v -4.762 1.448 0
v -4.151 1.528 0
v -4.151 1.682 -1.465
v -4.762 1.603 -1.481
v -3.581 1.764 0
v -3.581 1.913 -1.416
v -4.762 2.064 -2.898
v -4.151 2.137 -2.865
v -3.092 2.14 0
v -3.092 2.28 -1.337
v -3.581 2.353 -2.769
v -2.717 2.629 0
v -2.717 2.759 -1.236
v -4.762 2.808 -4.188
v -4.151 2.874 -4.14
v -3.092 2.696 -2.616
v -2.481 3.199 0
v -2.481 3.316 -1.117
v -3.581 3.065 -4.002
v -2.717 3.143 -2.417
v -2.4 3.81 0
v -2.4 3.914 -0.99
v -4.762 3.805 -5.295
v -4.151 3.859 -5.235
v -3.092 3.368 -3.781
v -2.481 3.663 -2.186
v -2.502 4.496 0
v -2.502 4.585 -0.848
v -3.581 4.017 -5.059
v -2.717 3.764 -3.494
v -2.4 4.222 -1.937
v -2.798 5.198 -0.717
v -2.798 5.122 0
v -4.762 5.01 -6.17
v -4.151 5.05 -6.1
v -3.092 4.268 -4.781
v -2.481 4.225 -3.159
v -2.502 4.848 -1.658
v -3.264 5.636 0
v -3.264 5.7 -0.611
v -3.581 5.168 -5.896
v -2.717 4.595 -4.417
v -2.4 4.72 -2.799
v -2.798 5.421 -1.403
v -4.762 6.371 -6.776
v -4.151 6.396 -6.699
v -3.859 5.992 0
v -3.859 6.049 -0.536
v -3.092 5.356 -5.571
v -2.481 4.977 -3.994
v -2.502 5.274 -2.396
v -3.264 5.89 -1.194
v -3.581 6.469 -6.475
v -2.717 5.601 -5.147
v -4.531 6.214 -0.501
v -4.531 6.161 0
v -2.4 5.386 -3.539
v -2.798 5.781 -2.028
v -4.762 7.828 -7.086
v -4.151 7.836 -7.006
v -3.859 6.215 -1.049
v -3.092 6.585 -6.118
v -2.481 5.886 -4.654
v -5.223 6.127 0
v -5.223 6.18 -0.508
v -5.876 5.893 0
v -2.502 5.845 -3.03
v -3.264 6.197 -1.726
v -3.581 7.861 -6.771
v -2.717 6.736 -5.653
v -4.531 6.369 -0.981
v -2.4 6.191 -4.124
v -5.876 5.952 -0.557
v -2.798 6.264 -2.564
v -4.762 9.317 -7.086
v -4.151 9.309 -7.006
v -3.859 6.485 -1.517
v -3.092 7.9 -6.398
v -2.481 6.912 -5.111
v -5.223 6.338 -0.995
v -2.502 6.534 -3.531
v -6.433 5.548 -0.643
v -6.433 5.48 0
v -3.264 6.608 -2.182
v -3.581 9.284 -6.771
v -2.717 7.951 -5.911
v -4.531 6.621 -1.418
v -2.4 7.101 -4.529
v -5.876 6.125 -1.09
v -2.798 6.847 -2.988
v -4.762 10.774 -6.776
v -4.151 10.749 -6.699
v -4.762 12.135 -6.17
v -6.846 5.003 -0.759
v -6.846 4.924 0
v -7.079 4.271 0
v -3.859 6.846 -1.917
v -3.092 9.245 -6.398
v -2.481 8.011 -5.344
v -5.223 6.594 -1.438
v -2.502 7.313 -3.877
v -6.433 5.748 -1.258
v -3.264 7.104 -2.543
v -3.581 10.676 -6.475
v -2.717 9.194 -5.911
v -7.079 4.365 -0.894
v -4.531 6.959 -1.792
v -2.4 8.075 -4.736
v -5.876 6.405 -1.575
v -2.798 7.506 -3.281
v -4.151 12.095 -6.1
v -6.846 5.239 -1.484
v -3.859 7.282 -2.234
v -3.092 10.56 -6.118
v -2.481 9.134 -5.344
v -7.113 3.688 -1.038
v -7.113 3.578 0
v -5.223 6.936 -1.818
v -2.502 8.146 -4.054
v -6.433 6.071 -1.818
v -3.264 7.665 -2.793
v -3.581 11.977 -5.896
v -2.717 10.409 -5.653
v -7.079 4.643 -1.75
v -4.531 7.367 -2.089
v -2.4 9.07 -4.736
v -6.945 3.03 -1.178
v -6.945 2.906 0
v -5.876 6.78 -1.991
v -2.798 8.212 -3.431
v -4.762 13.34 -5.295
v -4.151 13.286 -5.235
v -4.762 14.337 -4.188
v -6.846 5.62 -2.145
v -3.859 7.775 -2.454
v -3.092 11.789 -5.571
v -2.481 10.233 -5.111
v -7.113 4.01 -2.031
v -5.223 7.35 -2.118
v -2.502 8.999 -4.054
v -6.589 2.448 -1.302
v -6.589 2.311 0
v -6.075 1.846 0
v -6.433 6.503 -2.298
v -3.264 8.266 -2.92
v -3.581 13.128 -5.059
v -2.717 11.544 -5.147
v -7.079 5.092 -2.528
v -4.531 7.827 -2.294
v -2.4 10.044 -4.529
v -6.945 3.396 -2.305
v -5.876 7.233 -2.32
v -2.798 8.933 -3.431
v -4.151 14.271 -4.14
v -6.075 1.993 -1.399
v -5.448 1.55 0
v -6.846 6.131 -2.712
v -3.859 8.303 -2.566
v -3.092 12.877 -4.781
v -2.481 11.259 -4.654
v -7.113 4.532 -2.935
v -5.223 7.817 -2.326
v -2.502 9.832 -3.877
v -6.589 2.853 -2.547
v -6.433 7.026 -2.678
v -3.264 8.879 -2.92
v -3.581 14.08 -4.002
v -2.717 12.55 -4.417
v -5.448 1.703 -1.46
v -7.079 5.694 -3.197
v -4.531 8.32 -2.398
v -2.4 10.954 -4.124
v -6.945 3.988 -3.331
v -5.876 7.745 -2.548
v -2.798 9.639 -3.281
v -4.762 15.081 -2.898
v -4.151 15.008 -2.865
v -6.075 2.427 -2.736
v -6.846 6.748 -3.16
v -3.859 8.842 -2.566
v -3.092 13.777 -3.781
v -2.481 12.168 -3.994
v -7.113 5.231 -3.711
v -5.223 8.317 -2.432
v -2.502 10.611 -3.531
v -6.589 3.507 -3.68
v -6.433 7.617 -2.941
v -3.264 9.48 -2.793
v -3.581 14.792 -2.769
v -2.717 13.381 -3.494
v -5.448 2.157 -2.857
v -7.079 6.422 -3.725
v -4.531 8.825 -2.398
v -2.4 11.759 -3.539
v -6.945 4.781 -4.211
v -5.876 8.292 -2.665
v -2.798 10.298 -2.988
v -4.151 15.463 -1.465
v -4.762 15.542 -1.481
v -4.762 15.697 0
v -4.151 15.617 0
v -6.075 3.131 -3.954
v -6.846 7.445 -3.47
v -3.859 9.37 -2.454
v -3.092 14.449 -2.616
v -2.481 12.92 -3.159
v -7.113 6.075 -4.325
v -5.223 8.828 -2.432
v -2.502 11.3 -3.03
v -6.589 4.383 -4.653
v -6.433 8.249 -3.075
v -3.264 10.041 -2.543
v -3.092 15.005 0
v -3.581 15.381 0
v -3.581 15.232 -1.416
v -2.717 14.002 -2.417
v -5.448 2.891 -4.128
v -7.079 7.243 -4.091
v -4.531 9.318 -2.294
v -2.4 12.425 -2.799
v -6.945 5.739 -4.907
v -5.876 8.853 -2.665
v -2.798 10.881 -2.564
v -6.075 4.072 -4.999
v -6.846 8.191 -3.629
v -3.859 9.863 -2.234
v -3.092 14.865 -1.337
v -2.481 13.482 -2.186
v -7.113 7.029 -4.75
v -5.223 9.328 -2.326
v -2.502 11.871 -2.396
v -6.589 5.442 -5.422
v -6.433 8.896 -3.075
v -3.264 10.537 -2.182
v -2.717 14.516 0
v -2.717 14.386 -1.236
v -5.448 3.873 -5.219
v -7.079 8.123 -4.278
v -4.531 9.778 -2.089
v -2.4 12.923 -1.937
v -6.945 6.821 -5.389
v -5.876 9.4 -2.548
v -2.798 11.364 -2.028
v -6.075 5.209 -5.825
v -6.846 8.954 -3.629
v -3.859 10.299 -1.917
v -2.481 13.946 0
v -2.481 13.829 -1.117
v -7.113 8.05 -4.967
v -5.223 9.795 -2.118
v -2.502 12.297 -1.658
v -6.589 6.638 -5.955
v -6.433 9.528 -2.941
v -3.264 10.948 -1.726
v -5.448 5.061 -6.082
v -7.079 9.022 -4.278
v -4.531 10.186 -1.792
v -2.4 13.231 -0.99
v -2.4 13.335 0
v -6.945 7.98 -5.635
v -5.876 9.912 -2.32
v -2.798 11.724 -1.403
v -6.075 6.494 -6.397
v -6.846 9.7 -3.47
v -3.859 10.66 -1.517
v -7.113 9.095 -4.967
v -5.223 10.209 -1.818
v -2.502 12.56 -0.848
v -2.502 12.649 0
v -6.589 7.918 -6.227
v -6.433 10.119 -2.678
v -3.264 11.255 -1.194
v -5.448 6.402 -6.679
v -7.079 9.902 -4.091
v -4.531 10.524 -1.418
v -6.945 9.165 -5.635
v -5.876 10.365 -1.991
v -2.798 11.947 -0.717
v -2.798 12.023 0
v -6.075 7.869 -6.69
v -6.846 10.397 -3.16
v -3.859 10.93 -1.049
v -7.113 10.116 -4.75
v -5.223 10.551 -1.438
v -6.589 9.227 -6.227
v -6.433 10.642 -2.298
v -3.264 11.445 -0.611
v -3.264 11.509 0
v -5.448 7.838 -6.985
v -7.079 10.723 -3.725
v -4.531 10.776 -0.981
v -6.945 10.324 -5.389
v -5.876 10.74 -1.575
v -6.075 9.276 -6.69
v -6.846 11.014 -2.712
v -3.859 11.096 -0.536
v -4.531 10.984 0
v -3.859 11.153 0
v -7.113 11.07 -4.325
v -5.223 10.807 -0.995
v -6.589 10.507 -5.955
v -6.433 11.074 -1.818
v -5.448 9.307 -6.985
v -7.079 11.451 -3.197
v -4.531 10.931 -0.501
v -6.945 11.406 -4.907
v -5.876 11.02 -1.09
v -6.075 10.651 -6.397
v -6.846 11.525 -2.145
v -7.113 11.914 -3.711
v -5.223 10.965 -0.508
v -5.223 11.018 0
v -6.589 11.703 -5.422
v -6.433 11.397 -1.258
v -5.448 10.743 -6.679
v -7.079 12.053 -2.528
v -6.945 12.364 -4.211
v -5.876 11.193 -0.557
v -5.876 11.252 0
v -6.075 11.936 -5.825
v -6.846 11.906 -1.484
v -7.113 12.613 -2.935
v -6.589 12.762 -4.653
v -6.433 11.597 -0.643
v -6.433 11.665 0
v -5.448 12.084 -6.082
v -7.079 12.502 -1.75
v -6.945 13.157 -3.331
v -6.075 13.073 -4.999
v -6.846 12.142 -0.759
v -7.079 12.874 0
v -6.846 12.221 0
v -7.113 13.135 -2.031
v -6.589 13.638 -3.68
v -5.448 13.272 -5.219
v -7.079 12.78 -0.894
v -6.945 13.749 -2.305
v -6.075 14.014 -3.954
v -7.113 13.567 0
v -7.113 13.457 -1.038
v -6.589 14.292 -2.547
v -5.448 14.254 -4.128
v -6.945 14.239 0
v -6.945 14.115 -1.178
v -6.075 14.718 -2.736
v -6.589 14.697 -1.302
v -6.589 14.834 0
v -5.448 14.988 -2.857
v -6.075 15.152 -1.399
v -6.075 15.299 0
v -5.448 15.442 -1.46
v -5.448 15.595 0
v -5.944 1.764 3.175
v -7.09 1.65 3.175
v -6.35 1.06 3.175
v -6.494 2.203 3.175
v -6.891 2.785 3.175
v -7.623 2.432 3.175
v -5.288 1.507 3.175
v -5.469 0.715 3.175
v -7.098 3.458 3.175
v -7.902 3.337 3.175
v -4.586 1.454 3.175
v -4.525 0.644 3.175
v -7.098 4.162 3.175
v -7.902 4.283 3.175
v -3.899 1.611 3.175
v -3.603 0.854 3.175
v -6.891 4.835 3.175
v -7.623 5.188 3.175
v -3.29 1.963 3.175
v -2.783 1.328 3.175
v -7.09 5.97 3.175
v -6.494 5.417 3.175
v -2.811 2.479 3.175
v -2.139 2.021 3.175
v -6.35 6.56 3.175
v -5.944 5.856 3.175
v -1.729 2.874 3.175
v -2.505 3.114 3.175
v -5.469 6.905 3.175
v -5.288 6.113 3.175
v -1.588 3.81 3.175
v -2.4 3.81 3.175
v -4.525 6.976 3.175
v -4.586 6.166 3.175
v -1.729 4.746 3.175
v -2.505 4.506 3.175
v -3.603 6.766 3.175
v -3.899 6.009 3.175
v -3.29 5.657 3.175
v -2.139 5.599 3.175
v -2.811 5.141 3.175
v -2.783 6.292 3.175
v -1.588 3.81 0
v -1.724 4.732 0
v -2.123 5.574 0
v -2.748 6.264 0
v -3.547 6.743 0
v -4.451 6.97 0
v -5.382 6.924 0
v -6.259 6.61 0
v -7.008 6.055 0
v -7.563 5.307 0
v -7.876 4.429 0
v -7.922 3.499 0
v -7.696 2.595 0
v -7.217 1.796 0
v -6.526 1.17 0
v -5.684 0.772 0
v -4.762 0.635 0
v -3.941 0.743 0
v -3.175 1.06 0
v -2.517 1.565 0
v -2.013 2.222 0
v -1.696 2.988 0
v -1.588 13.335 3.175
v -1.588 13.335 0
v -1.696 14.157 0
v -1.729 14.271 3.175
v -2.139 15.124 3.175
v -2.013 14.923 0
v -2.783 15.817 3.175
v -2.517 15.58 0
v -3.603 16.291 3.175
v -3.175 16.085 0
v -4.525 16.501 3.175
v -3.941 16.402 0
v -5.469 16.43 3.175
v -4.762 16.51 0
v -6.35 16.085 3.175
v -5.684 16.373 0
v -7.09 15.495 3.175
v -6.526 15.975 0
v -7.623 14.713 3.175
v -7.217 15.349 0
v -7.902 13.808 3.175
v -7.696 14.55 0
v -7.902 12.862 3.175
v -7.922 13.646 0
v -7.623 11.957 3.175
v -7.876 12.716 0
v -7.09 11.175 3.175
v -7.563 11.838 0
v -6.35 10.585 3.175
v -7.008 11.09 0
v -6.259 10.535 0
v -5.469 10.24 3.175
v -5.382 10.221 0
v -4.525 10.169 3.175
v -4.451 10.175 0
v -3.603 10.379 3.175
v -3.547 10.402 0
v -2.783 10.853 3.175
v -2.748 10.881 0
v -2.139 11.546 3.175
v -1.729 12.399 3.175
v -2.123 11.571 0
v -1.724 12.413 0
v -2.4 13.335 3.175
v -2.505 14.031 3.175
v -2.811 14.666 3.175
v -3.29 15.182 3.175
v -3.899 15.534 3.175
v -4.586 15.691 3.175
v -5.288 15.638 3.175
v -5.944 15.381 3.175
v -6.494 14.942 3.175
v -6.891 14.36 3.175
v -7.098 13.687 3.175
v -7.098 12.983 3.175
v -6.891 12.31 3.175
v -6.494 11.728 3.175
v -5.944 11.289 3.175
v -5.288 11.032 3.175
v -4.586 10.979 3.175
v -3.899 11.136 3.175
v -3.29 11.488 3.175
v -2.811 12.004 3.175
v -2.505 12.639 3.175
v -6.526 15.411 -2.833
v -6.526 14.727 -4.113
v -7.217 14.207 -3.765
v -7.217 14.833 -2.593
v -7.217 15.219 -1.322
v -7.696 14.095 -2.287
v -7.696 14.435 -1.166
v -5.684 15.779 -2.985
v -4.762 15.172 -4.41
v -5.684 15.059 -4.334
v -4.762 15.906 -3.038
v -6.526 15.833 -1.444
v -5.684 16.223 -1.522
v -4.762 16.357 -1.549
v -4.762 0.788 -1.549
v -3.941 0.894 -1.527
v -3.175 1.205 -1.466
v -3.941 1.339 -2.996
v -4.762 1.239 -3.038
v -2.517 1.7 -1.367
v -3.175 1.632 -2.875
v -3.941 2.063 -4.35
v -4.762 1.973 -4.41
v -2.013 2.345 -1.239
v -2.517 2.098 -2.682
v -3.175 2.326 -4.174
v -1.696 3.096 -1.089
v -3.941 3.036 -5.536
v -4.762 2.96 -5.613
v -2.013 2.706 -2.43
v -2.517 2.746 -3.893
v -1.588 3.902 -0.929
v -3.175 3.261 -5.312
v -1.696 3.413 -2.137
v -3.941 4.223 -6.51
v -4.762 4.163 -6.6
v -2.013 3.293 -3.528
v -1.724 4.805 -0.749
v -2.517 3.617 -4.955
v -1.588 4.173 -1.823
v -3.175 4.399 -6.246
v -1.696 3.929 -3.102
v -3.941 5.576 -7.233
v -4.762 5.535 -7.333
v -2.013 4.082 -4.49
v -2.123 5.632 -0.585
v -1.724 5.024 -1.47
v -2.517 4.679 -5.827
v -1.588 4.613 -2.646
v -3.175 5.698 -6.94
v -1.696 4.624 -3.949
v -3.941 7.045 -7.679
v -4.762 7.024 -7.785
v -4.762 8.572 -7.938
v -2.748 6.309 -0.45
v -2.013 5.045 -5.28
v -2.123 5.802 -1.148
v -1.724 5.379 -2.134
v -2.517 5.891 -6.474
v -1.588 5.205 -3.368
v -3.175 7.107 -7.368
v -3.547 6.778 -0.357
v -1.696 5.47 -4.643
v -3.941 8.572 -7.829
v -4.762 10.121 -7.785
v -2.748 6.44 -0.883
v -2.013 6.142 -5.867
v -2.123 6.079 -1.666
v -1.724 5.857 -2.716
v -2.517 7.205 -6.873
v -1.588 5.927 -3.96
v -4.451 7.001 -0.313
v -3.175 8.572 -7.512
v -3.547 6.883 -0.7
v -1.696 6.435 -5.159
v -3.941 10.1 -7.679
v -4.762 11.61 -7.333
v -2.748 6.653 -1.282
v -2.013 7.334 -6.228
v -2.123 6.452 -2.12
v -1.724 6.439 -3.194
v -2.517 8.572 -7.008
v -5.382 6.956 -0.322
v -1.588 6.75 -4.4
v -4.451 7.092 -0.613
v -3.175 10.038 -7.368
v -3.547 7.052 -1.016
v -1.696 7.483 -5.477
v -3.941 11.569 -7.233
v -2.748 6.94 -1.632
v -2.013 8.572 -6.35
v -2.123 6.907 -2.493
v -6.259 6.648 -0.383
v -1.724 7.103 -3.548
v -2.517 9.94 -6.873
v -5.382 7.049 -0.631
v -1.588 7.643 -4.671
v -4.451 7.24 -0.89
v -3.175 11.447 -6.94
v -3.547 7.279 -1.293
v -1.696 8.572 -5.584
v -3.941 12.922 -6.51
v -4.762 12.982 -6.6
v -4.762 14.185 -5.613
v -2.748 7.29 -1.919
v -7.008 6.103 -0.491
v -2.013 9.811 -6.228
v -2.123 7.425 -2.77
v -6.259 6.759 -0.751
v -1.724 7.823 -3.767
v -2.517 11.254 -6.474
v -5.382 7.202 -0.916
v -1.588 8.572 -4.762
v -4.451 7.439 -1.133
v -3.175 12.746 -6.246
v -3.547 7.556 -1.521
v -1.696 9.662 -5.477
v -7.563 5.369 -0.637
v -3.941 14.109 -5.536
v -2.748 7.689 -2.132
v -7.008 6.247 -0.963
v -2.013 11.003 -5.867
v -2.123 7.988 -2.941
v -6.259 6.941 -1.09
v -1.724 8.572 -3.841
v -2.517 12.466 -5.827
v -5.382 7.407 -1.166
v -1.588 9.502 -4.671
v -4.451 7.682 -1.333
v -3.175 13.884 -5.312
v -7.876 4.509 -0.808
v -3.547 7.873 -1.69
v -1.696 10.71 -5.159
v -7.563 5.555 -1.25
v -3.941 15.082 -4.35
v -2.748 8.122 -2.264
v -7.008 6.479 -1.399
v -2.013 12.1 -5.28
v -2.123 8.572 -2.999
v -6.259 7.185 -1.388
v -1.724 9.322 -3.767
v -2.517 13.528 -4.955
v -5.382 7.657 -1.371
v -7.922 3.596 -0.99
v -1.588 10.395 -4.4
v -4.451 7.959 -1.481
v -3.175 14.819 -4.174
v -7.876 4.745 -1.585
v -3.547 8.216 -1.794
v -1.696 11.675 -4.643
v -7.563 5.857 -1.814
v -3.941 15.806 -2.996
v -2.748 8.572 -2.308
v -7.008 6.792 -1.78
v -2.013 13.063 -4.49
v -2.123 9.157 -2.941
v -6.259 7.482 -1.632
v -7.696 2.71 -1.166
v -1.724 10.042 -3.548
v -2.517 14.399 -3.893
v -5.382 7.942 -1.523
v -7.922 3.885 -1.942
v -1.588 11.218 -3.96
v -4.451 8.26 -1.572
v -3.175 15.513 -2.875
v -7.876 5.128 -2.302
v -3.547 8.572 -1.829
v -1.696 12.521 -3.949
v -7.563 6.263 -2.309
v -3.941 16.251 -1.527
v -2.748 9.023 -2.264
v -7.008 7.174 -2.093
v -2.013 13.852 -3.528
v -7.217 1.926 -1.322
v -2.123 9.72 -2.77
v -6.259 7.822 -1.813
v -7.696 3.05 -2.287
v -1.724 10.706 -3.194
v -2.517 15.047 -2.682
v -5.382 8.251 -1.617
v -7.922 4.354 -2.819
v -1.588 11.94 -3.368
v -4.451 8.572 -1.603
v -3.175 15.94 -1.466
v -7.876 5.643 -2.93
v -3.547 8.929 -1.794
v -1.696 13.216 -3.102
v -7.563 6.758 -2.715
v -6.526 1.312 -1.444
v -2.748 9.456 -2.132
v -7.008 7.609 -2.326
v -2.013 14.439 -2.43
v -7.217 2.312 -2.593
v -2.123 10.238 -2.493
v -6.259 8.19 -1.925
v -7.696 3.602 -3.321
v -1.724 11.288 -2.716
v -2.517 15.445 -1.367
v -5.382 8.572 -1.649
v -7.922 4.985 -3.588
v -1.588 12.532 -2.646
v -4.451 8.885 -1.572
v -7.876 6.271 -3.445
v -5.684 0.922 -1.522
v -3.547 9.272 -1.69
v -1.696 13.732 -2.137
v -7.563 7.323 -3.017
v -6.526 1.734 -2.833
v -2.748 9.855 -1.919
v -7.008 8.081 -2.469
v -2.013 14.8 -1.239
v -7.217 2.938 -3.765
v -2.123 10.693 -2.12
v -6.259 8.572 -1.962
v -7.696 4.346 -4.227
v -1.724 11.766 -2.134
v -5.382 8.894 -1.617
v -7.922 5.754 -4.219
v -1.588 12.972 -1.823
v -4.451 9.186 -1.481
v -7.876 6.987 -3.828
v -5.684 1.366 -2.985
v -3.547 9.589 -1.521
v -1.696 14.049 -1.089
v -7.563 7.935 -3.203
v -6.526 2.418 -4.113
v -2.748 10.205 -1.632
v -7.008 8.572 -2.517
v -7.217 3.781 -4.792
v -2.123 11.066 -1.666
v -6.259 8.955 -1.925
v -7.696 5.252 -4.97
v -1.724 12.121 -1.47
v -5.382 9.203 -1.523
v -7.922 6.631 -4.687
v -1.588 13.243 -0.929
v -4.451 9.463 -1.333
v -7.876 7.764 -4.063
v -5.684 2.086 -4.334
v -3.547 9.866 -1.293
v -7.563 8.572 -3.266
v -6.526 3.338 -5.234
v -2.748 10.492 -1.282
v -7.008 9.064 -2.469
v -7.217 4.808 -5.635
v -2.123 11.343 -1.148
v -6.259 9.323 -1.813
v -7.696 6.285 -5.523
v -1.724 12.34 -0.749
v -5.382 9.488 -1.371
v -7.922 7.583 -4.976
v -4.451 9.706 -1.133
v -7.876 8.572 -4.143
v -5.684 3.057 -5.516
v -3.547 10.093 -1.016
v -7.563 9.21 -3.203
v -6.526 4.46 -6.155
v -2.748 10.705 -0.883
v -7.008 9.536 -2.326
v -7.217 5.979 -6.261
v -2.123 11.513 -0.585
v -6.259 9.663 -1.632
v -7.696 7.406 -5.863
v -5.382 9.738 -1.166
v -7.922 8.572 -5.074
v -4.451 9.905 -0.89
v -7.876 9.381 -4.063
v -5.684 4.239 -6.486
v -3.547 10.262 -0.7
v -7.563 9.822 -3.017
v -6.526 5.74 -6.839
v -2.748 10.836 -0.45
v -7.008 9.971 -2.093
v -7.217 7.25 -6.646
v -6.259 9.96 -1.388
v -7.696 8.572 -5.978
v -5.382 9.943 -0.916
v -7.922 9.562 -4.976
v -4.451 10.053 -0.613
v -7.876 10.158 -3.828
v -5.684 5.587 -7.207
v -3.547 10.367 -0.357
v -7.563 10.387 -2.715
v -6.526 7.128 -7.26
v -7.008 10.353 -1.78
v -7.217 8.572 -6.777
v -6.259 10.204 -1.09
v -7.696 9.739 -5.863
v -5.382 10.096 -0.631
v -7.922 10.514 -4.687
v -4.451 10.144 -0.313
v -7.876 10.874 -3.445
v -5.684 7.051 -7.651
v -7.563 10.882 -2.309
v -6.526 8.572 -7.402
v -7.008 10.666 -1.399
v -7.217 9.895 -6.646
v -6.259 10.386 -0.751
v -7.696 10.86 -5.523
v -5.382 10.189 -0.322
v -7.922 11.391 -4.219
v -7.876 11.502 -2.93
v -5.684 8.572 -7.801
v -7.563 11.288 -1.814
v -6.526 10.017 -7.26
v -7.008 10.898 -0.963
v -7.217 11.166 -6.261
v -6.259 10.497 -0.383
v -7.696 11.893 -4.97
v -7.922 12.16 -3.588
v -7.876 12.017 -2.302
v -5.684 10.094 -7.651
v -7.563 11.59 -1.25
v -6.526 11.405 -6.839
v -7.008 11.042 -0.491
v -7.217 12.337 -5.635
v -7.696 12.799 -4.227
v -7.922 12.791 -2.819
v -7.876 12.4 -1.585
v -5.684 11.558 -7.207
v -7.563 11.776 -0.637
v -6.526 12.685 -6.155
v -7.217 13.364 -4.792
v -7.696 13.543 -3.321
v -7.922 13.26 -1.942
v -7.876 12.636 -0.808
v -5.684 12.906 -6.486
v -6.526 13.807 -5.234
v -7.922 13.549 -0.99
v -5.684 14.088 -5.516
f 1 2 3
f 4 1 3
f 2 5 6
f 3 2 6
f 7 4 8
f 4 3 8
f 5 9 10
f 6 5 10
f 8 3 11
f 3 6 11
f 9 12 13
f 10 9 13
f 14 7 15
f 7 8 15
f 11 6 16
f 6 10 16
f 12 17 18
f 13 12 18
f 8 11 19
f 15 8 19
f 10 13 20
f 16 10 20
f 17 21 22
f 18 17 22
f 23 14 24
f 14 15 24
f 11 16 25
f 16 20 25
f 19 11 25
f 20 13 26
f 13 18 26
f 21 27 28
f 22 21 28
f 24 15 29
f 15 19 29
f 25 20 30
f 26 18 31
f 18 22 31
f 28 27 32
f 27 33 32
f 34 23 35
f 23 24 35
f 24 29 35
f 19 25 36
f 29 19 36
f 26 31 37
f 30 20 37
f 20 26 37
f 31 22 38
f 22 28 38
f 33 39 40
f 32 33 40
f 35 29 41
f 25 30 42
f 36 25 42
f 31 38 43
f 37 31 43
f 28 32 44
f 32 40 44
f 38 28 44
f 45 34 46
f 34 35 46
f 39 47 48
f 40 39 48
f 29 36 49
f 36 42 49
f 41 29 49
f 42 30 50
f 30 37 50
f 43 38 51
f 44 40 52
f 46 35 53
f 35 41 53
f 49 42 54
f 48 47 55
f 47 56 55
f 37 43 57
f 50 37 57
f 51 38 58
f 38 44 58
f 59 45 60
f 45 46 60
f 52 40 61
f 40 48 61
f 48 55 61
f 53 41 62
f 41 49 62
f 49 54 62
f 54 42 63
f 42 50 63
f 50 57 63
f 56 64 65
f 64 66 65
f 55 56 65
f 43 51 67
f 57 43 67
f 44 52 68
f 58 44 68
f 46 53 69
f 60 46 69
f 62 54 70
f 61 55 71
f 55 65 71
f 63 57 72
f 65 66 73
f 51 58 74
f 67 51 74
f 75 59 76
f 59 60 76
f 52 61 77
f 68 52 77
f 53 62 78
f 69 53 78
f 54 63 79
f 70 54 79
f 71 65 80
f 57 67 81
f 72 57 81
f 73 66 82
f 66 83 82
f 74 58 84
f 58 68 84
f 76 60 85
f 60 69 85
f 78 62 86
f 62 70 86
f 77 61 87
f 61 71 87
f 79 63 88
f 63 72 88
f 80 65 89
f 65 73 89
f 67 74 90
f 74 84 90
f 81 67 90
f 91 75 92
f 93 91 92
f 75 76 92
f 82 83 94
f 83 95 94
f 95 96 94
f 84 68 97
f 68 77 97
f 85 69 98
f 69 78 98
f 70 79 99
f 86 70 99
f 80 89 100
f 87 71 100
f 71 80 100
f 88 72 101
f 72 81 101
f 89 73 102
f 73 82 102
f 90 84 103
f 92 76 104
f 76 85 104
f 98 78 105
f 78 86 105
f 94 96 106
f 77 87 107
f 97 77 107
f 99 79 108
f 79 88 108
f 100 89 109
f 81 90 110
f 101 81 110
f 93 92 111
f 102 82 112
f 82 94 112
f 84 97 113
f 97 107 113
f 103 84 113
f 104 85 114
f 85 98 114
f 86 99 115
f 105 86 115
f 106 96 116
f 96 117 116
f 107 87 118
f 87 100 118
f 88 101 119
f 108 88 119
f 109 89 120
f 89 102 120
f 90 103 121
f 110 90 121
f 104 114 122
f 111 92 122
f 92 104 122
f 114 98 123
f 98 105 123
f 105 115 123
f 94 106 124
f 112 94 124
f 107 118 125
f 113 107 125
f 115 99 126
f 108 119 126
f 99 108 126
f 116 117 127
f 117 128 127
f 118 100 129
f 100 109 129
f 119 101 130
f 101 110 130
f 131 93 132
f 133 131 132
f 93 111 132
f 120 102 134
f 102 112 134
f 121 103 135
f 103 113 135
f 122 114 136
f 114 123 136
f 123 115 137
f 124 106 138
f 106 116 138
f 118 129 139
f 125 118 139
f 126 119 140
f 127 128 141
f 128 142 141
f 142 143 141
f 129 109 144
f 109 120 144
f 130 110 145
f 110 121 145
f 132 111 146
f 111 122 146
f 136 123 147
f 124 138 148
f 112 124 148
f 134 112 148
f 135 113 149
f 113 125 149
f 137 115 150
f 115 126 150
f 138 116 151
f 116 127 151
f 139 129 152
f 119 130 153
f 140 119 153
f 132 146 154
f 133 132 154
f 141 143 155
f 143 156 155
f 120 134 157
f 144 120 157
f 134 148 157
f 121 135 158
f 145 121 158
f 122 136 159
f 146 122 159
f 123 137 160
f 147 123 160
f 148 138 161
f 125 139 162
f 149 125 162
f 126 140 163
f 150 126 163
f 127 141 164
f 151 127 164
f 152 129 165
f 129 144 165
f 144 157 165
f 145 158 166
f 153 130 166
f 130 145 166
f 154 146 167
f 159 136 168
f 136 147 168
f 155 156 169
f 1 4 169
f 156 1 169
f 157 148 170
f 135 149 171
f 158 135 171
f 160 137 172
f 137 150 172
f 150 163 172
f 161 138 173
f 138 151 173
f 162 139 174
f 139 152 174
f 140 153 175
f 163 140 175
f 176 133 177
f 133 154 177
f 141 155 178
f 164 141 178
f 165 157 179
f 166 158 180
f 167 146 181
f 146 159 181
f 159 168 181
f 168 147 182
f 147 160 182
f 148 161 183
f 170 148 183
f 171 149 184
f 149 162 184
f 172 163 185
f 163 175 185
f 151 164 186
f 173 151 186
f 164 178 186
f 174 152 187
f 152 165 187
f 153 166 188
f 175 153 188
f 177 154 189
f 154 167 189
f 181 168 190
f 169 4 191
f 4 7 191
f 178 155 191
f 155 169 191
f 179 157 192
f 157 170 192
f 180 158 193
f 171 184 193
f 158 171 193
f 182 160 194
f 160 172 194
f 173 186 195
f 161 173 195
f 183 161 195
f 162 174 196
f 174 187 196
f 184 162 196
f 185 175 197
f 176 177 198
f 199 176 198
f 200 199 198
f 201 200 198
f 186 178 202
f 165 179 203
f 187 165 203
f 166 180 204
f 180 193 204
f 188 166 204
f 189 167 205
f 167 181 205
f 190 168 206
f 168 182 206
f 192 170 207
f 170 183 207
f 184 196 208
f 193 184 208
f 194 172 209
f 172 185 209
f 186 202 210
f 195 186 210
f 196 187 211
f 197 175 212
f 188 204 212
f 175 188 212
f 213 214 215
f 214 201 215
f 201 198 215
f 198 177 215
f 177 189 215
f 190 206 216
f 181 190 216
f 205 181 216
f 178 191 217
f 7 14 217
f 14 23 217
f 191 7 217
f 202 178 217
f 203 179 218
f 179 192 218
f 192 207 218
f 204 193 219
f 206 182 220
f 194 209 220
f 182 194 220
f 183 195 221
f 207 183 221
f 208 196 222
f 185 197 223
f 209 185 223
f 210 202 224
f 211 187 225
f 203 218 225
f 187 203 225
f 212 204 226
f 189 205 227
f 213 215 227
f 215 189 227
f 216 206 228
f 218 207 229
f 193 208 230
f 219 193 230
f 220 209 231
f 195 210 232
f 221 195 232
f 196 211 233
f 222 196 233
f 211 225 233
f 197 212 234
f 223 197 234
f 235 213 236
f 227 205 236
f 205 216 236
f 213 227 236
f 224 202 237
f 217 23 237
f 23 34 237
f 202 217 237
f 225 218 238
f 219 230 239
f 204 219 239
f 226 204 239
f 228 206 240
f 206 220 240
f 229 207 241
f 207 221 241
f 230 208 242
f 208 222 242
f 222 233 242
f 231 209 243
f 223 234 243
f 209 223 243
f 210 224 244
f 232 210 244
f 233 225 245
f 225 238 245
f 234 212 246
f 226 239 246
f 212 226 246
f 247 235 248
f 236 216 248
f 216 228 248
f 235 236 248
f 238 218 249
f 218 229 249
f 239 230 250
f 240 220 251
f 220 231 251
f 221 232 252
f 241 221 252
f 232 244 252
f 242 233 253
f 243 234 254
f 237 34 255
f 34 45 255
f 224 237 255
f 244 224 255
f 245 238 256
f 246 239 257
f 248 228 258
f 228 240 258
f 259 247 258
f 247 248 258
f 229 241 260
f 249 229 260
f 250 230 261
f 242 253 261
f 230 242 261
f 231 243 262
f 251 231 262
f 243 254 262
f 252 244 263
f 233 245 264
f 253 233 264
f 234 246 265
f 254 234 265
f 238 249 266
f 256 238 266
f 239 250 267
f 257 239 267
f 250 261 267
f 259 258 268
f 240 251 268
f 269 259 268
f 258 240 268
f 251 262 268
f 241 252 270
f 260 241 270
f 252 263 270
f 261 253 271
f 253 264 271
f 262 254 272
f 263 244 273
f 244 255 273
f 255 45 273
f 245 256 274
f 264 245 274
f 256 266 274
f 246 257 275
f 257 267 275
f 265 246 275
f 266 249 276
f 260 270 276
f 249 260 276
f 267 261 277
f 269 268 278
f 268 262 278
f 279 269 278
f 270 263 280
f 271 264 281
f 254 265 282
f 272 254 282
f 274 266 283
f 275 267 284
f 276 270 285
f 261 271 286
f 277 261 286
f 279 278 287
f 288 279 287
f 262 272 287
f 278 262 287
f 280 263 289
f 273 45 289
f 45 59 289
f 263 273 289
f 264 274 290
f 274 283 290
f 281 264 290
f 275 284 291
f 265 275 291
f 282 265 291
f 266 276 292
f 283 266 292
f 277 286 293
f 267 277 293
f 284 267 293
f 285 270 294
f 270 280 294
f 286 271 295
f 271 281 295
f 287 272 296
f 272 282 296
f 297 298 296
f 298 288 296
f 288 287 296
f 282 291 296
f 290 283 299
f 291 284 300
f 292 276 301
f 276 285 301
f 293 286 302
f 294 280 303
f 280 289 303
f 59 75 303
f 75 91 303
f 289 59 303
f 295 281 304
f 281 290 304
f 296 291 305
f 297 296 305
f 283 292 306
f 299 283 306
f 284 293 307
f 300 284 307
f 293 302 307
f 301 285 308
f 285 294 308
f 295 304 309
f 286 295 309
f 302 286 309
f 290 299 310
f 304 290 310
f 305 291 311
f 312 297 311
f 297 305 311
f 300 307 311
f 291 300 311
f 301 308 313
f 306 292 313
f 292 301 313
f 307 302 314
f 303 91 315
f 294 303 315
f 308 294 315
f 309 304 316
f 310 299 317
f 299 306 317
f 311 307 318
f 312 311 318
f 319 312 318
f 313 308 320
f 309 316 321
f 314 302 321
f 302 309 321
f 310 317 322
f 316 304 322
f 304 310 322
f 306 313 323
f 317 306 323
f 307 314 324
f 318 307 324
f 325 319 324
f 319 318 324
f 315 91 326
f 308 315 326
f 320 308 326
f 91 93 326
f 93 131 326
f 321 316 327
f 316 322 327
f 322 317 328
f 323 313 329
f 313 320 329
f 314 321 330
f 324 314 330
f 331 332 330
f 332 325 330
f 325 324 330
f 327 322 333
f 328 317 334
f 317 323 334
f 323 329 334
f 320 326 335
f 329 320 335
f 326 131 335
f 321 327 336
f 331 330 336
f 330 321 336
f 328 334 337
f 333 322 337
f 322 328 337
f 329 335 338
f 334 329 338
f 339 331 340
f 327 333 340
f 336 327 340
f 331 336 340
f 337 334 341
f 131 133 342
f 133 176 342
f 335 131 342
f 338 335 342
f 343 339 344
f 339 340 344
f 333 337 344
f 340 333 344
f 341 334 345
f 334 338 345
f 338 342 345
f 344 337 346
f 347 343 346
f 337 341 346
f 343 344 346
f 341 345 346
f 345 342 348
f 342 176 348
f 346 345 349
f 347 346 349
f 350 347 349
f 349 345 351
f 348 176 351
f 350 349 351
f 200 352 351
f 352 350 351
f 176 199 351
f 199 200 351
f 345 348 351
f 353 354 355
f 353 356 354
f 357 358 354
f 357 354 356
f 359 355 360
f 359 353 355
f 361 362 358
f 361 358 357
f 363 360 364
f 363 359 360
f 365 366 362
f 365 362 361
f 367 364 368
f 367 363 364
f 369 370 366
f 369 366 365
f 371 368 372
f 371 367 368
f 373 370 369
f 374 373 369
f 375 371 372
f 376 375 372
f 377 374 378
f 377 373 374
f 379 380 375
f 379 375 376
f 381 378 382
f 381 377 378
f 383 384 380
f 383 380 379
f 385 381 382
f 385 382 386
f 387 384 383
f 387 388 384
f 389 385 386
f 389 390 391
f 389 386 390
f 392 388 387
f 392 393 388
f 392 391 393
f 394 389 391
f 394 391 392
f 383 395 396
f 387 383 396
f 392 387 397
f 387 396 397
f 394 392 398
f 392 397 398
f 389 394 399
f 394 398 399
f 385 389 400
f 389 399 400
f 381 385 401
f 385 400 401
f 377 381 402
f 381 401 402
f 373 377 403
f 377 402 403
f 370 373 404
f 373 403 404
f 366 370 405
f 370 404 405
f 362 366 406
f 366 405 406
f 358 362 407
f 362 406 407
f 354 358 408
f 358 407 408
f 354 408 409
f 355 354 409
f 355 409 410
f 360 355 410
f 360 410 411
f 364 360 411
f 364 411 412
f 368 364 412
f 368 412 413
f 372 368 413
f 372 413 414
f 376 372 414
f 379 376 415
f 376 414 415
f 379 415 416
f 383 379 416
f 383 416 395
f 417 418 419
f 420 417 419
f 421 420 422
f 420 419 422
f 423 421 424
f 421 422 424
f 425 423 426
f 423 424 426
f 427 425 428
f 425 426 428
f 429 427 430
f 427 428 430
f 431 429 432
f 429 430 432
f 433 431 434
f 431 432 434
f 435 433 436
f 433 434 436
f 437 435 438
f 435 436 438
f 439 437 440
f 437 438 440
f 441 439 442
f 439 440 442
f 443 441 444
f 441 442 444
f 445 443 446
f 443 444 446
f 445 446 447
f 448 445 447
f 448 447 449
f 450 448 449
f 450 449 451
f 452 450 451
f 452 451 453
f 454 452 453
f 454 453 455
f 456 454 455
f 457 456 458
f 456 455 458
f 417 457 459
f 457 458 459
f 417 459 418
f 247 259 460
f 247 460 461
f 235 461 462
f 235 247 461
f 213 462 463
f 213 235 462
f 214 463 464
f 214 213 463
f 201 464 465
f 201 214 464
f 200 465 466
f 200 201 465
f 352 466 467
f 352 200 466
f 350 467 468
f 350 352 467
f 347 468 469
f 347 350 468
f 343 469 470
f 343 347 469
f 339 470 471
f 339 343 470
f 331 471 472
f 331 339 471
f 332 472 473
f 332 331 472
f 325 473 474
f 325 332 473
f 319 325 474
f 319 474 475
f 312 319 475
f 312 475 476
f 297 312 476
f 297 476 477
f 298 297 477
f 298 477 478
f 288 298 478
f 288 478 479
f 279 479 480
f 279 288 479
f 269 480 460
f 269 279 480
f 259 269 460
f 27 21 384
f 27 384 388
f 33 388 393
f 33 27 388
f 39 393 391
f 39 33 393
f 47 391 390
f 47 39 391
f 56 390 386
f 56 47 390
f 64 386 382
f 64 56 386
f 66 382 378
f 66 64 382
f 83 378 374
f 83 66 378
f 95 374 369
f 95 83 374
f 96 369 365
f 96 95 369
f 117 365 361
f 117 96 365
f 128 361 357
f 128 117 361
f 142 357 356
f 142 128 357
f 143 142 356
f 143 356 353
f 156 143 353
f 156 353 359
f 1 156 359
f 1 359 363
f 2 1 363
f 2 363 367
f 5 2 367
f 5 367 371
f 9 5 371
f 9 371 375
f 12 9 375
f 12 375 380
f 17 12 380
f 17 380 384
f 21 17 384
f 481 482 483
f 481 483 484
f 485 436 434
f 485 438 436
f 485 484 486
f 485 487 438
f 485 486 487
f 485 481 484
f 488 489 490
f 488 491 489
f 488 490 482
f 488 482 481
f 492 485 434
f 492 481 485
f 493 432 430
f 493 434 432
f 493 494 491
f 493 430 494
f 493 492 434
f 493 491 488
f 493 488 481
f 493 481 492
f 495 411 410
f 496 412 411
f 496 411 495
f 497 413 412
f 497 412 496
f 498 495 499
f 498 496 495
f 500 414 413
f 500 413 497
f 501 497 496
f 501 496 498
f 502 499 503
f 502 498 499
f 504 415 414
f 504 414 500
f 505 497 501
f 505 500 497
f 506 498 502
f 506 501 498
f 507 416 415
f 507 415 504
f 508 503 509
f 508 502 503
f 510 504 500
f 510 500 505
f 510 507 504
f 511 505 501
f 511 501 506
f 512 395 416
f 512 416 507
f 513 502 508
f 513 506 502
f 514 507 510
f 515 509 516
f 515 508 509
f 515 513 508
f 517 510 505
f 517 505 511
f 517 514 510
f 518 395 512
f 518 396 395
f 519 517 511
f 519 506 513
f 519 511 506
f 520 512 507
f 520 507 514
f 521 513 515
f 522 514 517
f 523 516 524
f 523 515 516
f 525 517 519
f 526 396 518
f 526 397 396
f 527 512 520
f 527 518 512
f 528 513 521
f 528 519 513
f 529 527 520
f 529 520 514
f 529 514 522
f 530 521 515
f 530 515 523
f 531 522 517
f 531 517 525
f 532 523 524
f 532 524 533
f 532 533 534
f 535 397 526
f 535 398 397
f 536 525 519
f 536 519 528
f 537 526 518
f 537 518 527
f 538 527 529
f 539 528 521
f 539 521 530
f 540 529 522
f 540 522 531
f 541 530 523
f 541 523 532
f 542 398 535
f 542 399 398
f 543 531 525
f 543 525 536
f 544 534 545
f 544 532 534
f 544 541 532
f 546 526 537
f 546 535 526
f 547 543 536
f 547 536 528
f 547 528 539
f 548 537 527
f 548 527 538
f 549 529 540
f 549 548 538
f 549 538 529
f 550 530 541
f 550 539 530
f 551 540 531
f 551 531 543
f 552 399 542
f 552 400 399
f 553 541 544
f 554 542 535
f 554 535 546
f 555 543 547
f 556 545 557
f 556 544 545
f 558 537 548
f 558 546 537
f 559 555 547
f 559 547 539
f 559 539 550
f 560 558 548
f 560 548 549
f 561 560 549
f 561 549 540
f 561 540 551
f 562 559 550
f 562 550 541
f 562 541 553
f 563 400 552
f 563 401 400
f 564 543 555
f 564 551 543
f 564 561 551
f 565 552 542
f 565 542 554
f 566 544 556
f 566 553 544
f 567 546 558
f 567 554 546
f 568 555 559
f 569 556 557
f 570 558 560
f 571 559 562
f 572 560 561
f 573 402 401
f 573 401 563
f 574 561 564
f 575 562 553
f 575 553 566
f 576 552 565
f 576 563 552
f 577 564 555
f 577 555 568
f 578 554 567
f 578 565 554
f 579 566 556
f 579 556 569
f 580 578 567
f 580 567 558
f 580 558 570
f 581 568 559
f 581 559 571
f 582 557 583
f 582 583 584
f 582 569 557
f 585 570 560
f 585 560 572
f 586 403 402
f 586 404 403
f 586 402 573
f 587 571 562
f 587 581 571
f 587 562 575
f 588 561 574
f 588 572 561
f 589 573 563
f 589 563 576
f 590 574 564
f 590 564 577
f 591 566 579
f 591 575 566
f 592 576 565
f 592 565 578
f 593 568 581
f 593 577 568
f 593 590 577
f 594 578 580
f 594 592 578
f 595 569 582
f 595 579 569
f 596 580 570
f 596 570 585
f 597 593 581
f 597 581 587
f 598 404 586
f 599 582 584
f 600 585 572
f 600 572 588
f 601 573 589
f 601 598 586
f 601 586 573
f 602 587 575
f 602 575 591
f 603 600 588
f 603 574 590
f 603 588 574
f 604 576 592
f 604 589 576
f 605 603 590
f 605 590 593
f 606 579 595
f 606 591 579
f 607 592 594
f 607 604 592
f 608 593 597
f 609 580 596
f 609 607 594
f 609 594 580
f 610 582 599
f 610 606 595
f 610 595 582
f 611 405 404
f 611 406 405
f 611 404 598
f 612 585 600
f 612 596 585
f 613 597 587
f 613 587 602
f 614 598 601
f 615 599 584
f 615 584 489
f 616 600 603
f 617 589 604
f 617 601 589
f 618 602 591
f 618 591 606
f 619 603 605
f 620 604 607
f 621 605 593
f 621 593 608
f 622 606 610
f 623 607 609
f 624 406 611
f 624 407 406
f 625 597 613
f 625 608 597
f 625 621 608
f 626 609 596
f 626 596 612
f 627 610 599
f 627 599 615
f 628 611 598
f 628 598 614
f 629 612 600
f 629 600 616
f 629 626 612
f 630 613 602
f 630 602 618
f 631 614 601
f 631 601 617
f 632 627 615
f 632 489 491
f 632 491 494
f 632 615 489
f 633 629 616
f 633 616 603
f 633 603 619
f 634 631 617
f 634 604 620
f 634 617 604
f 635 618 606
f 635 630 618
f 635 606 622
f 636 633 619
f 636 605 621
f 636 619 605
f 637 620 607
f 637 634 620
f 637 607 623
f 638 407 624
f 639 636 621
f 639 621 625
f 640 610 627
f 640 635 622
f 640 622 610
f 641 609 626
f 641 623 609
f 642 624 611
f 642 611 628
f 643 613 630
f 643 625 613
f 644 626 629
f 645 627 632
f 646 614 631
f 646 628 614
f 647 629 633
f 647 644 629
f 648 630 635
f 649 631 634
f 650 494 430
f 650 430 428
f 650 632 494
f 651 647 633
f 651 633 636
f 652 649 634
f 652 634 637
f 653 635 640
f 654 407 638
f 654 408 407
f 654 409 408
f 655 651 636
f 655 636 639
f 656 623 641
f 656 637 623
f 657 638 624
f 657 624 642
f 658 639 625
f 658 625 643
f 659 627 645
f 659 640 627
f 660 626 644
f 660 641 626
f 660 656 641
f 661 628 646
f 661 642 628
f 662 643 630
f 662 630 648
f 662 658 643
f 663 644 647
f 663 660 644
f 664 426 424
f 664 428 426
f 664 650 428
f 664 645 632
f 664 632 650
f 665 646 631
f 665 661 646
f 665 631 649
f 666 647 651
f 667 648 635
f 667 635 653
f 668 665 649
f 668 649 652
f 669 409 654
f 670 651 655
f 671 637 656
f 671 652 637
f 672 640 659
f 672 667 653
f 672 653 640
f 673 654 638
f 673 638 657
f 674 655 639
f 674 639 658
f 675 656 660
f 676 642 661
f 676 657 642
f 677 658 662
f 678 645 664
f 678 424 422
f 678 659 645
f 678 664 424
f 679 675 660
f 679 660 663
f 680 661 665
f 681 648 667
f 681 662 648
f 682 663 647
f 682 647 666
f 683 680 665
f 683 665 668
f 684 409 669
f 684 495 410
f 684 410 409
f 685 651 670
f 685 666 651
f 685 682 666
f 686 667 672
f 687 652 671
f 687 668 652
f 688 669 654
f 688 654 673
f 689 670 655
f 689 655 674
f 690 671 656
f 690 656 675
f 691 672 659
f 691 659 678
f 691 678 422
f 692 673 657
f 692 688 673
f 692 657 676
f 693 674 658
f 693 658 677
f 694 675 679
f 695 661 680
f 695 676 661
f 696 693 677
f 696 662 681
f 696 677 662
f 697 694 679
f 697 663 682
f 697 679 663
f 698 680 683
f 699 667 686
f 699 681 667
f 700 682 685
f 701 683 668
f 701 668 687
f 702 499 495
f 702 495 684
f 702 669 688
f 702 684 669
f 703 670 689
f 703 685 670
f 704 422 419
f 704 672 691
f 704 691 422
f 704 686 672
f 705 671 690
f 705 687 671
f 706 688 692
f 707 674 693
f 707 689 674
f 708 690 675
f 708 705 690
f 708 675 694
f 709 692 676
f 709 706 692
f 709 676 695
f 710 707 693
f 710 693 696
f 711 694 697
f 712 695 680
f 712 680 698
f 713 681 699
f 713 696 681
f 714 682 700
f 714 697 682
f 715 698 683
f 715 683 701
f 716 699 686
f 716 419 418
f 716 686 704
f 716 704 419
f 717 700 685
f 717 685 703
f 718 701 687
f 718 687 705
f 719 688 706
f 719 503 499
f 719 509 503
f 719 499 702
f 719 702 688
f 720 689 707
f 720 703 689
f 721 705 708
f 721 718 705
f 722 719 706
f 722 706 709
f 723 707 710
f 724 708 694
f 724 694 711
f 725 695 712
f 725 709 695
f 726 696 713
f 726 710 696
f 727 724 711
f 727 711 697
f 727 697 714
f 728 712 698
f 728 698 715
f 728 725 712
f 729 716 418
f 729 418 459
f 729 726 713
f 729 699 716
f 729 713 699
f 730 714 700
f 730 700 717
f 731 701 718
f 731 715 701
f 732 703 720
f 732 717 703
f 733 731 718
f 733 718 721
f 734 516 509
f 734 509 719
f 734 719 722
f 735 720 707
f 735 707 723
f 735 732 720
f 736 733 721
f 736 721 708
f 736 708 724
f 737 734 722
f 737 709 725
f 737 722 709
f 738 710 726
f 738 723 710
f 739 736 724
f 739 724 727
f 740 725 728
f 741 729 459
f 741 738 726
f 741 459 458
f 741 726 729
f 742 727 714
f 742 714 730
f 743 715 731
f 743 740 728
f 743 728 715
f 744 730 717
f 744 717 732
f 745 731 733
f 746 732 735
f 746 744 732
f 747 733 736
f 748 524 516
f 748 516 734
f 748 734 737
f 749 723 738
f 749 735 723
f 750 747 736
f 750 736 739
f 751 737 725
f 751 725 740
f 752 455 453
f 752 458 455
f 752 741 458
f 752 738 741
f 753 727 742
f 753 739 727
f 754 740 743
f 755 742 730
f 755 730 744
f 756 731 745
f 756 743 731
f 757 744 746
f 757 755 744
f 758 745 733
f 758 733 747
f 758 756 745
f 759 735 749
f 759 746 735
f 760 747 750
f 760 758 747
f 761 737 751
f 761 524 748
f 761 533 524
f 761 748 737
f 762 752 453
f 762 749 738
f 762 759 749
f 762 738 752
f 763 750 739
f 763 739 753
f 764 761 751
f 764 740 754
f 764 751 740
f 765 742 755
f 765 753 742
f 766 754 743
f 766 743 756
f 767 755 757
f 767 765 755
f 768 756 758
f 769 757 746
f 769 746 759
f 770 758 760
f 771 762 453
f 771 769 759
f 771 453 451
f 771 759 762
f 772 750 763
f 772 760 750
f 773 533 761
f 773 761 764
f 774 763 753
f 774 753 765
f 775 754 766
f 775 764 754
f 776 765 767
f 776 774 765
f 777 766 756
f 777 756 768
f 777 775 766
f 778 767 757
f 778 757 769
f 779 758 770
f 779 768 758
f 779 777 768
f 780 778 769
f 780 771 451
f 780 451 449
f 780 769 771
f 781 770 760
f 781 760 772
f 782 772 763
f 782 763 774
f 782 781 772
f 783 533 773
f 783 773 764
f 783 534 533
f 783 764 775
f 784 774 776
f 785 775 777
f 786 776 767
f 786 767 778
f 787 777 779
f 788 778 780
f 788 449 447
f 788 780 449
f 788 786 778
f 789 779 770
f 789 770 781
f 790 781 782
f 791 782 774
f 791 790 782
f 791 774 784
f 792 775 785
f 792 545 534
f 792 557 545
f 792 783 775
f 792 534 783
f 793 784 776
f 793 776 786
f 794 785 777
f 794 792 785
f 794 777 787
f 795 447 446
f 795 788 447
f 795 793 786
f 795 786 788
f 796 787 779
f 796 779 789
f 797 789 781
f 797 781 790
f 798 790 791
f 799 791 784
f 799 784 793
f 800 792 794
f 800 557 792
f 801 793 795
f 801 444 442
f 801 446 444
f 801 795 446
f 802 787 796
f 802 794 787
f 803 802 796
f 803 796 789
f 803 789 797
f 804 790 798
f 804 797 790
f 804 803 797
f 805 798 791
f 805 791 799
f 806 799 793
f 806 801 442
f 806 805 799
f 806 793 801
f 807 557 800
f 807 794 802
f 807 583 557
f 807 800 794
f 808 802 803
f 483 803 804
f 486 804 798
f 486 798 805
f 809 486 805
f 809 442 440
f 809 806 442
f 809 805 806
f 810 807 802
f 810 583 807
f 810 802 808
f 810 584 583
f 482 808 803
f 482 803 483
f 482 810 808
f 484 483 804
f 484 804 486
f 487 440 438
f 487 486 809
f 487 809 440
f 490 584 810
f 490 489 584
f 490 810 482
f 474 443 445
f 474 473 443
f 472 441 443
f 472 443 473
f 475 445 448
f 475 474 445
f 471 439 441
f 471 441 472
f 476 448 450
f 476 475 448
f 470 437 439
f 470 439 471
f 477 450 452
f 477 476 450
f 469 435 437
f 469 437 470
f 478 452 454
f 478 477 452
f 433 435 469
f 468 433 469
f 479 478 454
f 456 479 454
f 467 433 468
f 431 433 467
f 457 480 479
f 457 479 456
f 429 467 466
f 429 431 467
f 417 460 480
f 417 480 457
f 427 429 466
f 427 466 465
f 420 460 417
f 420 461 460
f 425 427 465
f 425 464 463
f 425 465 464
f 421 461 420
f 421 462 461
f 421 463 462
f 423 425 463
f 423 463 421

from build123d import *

# Parameters (mm, degrees)
SKETCH1_R             = 3.175
SKETCH1_R_2           = 2.3622
BOSS_EXTRUDE1_DEPTH   = 3.175
BOSS_EXTRUDE1_2_DEPTH = 3.175
SKETCH2_R             = 3.175
SKETCH2_R_2           = 2.3622
REVOLVE1_ANGLE        = 180


with BuildPart() as part:
    # Sketch1 → Boss-Extrude1 (new body)
    with BuildSketch(Plane.XY):
        with Locations((-4.7625, 13.335)):
            Circle(SKETCH1_R)
        with Locations((-4.7625, 13.335)):
            Circle(SKETCH1_R_2, mode=Mode.SUBTRACT)
    extrude(amount=BOSS_EXTRUDE1_DEPTH)



with BuildPart() as body_2:
    # Sketch1 → Boss-Extrude1 2 (new body)
    with BuildSketch(Plane.XY):
        with Locations((-4.7625, 3.81)):
            Circle(SKETCH1_R)
        with Locations((-4.7625, 3.81)):
            Circle(SKETCH1_R_2, mode=Mode.SUBTRACT)
    extrude(amount=BOSS_EXTRUDE1_2_DEPTH)


with BuildPart() as part_1:
    add(part.part)

    add(body_2.part)  # Revolve1 merges body 2
    # Sketch2 → Revolve1 (revolve)
    with BuildSketch(Plane(origin=(0, 0, 0), x_dir=(-1, 0, 0), z_dir=(0, 0, -1))):
        with Locations((4.7625, 13.335)):
            Circle(SKETCH2_R)
        with Locations((4.7625, 13.335)):
            Circle(SKETCH2_R_2, mode=Mode.SUBTRACT)
    revolve(axis=Axis((-4.888279011, 8.5725, 0), (-1, 0, 0)), revolution_arc=REVOLVE1_ANGLE)


solid = part_1.part
